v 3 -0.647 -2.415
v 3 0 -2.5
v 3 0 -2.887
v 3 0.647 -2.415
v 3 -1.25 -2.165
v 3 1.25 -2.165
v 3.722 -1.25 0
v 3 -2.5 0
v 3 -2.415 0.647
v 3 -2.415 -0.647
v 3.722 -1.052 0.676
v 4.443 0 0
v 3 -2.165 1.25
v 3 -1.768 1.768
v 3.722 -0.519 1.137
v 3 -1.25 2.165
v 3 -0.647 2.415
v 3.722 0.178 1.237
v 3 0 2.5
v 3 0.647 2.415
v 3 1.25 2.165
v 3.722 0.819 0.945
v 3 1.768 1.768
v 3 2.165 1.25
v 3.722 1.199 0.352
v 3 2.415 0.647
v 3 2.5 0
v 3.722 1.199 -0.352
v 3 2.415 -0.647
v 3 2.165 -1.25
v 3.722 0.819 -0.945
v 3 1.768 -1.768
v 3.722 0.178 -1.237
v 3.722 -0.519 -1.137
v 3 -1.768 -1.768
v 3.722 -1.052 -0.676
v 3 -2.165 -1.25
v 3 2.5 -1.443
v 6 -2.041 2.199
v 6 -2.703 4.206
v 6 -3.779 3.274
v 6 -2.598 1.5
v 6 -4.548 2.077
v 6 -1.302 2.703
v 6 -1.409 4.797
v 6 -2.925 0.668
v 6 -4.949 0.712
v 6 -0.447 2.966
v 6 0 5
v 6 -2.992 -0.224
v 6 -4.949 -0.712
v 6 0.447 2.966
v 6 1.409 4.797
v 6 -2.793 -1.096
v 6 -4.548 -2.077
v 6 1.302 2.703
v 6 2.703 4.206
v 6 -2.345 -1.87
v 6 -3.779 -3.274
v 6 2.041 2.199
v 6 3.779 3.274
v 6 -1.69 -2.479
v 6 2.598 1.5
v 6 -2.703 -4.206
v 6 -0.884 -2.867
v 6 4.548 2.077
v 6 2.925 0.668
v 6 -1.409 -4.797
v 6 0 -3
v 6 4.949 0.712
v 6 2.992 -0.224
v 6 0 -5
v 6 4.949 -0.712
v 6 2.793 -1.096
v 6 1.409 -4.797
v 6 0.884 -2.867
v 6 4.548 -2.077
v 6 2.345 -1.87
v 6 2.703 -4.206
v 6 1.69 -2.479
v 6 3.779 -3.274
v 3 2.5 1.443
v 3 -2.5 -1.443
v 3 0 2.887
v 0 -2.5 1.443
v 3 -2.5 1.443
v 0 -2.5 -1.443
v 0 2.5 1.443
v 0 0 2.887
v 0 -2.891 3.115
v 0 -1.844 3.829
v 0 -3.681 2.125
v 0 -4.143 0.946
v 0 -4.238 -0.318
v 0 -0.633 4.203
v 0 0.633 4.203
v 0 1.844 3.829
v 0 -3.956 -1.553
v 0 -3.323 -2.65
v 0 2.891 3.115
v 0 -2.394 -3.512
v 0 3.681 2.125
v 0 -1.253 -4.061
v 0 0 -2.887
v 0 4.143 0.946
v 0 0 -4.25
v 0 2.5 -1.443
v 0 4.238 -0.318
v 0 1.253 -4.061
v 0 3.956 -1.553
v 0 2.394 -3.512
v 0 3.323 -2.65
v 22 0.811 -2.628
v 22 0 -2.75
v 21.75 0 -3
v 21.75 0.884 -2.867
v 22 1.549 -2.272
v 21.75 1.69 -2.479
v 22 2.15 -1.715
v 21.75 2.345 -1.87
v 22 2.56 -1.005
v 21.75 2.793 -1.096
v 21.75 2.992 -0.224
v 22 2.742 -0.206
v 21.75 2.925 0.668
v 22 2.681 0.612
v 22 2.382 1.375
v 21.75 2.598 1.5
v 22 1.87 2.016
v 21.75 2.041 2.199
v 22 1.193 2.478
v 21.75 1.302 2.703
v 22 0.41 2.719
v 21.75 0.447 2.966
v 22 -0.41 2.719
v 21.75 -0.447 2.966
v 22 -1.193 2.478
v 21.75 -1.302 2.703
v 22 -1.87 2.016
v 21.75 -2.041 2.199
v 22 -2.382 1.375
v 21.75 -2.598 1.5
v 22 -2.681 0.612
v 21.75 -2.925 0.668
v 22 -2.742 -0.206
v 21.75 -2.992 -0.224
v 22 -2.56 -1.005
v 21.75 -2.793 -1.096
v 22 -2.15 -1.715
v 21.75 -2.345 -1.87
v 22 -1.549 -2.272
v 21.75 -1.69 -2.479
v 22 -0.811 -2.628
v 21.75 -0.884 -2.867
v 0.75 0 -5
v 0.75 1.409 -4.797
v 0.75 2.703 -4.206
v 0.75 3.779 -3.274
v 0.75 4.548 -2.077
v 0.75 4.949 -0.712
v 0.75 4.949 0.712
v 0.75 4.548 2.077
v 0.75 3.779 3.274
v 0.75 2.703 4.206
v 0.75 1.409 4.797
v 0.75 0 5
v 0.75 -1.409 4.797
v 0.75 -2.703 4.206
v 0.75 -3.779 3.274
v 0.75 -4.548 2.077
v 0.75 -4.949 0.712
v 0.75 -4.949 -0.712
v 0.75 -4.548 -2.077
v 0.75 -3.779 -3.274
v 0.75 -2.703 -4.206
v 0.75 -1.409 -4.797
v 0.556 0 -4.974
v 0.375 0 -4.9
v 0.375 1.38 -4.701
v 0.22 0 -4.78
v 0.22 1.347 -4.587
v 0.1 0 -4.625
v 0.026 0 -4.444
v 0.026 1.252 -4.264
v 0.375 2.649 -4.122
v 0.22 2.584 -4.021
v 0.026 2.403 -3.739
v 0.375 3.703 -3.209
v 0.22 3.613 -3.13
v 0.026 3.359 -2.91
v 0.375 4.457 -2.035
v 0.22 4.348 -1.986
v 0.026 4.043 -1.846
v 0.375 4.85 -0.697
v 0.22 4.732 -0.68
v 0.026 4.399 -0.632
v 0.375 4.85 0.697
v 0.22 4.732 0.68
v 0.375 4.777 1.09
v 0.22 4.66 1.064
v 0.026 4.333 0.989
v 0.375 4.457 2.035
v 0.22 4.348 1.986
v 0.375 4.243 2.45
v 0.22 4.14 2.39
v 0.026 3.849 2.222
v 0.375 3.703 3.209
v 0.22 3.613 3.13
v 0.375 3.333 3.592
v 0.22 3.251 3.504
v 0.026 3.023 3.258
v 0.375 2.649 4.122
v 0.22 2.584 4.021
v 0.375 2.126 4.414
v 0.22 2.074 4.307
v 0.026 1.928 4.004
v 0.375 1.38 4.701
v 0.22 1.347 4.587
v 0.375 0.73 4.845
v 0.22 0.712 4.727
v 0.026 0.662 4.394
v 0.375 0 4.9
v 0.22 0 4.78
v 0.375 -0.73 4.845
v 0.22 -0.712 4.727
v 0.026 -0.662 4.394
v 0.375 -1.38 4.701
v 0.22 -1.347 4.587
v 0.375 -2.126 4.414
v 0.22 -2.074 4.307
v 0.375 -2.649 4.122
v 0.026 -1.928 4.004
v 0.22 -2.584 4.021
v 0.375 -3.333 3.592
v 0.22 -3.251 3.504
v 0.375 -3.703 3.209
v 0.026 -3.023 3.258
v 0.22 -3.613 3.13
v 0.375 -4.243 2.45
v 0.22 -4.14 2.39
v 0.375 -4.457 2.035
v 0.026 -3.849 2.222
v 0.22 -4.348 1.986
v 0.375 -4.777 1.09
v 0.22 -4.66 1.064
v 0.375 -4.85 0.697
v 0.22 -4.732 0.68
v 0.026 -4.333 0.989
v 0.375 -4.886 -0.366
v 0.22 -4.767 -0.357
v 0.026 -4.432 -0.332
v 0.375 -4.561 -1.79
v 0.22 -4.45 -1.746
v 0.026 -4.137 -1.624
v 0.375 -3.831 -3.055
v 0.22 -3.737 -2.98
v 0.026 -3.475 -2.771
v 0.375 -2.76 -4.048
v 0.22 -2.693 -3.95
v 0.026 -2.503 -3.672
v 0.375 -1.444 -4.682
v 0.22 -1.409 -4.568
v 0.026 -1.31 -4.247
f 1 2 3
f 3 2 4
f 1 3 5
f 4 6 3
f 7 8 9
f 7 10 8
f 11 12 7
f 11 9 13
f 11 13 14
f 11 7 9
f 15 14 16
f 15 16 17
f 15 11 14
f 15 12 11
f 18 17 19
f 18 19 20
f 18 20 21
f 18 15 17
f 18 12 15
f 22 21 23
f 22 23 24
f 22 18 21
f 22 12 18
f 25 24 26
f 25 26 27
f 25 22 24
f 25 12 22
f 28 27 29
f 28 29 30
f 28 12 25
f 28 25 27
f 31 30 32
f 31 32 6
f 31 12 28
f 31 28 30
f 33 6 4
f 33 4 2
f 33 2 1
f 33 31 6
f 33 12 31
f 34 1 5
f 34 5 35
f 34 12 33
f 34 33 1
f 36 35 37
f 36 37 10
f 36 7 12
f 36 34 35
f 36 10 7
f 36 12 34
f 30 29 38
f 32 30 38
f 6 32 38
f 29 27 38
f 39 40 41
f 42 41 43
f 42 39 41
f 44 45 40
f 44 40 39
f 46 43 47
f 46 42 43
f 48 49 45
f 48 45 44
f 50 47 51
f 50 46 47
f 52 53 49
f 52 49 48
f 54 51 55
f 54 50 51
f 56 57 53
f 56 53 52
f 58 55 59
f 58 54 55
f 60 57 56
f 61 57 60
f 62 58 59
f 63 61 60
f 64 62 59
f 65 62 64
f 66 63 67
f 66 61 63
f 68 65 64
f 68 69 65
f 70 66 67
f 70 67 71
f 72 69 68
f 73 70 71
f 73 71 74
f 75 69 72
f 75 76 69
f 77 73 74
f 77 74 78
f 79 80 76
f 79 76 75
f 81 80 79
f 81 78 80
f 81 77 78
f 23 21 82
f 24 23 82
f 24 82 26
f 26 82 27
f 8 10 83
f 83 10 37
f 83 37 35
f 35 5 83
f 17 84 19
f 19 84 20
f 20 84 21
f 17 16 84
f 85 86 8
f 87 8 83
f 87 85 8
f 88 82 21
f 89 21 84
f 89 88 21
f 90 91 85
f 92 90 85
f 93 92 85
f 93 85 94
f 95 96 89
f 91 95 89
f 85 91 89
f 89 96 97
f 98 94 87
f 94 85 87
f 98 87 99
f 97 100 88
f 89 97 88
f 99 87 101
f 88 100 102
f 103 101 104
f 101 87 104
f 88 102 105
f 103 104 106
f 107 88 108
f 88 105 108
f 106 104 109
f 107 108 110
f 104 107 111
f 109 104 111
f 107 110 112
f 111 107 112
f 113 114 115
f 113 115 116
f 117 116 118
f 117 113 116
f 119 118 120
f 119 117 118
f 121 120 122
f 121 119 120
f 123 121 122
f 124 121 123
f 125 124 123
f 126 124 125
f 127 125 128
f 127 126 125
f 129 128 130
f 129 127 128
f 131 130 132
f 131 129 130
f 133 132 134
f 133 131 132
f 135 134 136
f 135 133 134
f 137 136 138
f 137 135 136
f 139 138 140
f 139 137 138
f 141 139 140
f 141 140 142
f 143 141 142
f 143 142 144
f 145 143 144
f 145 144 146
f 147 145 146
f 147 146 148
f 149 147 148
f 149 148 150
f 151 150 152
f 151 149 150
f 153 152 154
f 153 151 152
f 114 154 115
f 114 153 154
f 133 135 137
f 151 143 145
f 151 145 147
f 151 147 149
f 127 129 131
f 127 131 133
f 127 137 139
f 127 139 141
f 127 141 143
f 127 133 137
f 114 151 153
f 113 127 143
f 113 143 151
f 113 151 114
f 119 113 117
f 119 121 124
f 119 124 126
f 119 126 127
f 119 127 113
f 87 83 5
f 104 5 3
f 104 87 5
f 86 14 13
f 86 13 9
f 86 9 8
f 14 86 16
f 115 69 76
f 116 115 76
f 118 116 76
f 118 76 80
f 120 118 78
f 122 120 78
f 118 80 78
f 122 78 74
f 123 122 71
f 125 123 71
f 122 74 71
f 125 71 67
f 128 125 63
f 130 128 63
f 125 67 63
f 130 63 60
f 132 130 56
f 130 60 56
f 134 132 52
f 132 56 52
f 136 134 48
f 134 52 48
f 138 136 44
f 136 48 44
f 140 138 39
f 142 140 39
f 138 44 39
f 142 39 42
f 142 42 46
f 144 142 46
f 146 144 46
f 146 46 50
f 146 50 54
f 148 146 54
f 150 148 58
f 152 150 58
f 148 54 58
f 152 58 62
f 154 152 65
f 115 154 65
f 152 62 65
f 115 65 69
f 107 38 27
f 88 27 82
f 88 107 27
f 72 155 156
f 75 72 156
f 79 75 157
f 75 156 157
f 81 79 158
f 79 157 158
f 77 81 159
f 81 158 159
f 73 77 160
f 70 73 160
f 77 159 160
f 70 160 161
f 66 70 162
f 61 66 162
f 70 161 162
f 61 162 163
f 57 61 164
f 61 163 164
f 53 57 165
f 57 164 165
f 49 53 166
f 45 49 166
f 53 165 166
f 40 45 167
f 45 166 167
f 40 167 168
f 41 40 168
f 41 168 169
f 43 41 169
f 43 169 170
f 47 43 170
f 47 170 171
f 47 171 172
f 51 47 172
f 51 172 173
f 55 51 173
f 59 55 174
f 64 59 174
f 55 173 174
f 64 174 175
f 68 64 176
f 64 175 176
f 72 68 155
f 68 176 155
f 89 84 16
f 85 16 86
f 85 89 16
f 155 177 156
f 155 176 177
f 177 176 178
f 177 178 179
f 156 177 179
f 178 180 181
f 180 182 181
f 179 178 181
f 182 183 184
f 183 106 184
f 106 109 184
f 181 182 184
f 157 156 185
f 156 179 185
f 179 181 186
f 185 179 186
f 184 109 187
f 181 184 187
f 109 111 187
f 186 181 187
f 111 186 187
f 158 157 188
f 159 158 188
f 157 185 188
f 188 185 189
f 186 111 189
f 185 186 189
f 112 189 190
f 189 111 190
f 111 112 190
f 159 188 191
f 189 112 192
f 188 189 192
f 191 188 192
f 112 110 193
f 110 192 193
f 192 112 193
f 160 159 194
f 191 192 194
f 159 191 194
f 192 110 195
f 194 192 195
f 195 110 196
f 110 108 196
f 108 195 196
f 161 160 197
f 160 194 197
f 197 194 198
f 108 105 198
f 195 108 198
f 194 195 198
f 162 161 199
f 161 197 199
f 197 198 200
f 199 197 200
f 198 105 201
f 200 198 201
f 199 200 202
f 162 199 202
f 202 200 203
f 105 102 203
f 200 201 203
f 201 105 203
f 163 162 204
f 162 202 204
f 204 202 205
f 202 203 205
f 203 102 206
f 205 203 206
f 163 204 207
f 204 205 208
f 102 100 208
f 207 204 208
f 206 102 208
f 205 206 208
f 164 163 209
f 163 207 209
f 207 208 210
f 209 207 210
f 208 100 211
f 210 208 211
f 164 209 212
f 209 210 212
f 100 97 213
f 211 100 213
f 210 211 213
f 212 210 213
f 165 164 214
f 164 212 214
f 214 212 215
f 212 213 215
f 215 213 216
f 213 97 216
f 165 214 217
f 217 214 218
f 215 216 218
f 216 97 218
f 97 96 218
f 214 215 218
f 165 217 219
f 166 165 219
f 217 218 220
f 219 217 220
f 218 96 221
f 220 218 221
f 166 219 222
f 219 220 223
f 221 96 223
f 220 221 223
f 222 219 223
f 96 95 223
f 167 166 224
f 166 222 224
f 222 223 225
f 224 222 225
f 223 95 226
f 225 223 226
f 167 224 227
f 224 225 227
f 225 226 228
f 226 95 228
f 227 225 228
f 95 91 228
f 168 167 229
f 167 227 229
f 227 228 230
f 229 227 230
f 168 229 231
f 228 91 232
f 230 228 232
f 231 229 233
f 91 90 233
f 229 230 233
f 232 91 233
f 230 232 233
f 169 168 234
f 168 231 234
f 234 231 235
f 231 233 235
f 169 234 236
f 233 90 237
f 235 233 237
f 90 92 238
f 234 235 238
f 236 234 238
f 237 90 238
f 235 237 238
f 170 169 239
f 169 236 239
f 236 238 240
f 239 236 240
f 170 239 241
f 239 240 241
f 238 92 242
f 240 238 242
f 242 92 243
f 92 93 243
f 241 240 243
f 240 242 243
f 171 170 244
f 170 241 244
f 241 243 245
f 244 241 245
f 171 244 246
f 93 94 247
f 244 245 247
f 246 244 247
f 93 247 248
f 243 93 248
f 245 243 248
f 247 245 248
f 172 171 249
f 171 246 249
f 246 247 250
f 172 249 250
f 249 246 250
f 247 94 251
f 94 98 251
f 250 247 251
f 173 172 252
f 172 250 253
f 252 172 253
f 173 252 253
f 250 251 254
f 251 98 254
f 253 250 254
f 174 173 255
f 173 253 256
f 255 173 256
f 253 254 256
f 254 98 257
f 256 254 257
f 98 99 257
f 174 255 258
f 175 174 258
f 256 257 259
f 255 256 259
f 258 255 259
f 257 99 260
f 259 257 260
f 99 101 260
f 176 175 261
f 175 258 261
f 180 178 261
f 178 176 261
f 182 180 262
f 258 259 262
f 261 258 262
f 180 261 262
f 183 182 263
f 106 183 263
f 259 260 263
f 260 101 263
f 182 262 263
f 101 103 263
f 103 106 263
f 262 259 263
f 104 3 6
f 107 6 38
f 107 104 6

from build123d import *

# Parameters (mm, degrees)
SKETCH1_R           = 5
BASEHEAD_DEPTH      = 6
SKETCH2_R           = 3
BASEBODY_DEPTH      = 16
HEXAGONSOCKET_DEPTH = 3
TOPFILLET_R         = 0.75
CHAMFER1_SIZE       = 0.25


with BuildPart() as part:
    # Sketch1 → BaseHead (new body)
    with BuildSketch(Plane(origin=(0, 0, 0), x_dir=(0, 0, -1), z_dir=(1, 0, 0))):
        Circle(SKETCH1_R)
    extrude(amount=BASEHEAD_DEPTH)

    # Sketch2 → BaseBody (add)
    with BuildSketch(Plane(origin=(6, 0, 0), x_dir=(0, 0, -1), z_dir=(1, 0, 0))):
        Circle(SKETCH2_R)
    extrude(amount=BASEBODY_DEPTH)

    # Sketch3 → HexagonSocket (cut)
    with BuildSketch(Plane(origin=(0, 0, 0), x_dir=(0, 0, -1), z_dir=(1, 0, 0))):
        Polygon((2.886751346, 0), (1.443375673, 2.5), (-1.443375673, 2.5), (-2.886751346, 0), (-1.443375673, -2.5), (1.443375673, -2.5), align=None)
    extrude(amount=HEXAGONSOCKET_DEPTH, mode=Mode.SUBTRACT)

    # Sketch4 → Cut-Revolve1 (revolve, cut)
    with BuildSketch(Plane(origin=(-4.19613823, 0.75, 0), x_dir=(-1, 0, 0), z_dir=(0, 0, 1))):
        Polygon((-7.19613823, 3.25), (-8.639513903, 0.75), (-7.19613823, 0.75), align=None)
    revolve(axis=Axis((0.838992387, 0, 0), (-1, 0, 0)), mode=Mode.SUBTRACT)

    # TopFillet
    topfillet_edges = [part.edges().sort_by_distance(p)[0] for p in [
        (0, 0, 5),
    ]]
    fillet(topfillet_edges, radius=TOPFILLET_R)

    # Chamfer1
    chamfer1_edges = [part.edges().sort_by_distance(p)[0] for p in [
        (22, 0, 3),
    ]]
    chamfer(chamfer1_edges, length=CHAMFER1_SIZE)


solid = part.part
